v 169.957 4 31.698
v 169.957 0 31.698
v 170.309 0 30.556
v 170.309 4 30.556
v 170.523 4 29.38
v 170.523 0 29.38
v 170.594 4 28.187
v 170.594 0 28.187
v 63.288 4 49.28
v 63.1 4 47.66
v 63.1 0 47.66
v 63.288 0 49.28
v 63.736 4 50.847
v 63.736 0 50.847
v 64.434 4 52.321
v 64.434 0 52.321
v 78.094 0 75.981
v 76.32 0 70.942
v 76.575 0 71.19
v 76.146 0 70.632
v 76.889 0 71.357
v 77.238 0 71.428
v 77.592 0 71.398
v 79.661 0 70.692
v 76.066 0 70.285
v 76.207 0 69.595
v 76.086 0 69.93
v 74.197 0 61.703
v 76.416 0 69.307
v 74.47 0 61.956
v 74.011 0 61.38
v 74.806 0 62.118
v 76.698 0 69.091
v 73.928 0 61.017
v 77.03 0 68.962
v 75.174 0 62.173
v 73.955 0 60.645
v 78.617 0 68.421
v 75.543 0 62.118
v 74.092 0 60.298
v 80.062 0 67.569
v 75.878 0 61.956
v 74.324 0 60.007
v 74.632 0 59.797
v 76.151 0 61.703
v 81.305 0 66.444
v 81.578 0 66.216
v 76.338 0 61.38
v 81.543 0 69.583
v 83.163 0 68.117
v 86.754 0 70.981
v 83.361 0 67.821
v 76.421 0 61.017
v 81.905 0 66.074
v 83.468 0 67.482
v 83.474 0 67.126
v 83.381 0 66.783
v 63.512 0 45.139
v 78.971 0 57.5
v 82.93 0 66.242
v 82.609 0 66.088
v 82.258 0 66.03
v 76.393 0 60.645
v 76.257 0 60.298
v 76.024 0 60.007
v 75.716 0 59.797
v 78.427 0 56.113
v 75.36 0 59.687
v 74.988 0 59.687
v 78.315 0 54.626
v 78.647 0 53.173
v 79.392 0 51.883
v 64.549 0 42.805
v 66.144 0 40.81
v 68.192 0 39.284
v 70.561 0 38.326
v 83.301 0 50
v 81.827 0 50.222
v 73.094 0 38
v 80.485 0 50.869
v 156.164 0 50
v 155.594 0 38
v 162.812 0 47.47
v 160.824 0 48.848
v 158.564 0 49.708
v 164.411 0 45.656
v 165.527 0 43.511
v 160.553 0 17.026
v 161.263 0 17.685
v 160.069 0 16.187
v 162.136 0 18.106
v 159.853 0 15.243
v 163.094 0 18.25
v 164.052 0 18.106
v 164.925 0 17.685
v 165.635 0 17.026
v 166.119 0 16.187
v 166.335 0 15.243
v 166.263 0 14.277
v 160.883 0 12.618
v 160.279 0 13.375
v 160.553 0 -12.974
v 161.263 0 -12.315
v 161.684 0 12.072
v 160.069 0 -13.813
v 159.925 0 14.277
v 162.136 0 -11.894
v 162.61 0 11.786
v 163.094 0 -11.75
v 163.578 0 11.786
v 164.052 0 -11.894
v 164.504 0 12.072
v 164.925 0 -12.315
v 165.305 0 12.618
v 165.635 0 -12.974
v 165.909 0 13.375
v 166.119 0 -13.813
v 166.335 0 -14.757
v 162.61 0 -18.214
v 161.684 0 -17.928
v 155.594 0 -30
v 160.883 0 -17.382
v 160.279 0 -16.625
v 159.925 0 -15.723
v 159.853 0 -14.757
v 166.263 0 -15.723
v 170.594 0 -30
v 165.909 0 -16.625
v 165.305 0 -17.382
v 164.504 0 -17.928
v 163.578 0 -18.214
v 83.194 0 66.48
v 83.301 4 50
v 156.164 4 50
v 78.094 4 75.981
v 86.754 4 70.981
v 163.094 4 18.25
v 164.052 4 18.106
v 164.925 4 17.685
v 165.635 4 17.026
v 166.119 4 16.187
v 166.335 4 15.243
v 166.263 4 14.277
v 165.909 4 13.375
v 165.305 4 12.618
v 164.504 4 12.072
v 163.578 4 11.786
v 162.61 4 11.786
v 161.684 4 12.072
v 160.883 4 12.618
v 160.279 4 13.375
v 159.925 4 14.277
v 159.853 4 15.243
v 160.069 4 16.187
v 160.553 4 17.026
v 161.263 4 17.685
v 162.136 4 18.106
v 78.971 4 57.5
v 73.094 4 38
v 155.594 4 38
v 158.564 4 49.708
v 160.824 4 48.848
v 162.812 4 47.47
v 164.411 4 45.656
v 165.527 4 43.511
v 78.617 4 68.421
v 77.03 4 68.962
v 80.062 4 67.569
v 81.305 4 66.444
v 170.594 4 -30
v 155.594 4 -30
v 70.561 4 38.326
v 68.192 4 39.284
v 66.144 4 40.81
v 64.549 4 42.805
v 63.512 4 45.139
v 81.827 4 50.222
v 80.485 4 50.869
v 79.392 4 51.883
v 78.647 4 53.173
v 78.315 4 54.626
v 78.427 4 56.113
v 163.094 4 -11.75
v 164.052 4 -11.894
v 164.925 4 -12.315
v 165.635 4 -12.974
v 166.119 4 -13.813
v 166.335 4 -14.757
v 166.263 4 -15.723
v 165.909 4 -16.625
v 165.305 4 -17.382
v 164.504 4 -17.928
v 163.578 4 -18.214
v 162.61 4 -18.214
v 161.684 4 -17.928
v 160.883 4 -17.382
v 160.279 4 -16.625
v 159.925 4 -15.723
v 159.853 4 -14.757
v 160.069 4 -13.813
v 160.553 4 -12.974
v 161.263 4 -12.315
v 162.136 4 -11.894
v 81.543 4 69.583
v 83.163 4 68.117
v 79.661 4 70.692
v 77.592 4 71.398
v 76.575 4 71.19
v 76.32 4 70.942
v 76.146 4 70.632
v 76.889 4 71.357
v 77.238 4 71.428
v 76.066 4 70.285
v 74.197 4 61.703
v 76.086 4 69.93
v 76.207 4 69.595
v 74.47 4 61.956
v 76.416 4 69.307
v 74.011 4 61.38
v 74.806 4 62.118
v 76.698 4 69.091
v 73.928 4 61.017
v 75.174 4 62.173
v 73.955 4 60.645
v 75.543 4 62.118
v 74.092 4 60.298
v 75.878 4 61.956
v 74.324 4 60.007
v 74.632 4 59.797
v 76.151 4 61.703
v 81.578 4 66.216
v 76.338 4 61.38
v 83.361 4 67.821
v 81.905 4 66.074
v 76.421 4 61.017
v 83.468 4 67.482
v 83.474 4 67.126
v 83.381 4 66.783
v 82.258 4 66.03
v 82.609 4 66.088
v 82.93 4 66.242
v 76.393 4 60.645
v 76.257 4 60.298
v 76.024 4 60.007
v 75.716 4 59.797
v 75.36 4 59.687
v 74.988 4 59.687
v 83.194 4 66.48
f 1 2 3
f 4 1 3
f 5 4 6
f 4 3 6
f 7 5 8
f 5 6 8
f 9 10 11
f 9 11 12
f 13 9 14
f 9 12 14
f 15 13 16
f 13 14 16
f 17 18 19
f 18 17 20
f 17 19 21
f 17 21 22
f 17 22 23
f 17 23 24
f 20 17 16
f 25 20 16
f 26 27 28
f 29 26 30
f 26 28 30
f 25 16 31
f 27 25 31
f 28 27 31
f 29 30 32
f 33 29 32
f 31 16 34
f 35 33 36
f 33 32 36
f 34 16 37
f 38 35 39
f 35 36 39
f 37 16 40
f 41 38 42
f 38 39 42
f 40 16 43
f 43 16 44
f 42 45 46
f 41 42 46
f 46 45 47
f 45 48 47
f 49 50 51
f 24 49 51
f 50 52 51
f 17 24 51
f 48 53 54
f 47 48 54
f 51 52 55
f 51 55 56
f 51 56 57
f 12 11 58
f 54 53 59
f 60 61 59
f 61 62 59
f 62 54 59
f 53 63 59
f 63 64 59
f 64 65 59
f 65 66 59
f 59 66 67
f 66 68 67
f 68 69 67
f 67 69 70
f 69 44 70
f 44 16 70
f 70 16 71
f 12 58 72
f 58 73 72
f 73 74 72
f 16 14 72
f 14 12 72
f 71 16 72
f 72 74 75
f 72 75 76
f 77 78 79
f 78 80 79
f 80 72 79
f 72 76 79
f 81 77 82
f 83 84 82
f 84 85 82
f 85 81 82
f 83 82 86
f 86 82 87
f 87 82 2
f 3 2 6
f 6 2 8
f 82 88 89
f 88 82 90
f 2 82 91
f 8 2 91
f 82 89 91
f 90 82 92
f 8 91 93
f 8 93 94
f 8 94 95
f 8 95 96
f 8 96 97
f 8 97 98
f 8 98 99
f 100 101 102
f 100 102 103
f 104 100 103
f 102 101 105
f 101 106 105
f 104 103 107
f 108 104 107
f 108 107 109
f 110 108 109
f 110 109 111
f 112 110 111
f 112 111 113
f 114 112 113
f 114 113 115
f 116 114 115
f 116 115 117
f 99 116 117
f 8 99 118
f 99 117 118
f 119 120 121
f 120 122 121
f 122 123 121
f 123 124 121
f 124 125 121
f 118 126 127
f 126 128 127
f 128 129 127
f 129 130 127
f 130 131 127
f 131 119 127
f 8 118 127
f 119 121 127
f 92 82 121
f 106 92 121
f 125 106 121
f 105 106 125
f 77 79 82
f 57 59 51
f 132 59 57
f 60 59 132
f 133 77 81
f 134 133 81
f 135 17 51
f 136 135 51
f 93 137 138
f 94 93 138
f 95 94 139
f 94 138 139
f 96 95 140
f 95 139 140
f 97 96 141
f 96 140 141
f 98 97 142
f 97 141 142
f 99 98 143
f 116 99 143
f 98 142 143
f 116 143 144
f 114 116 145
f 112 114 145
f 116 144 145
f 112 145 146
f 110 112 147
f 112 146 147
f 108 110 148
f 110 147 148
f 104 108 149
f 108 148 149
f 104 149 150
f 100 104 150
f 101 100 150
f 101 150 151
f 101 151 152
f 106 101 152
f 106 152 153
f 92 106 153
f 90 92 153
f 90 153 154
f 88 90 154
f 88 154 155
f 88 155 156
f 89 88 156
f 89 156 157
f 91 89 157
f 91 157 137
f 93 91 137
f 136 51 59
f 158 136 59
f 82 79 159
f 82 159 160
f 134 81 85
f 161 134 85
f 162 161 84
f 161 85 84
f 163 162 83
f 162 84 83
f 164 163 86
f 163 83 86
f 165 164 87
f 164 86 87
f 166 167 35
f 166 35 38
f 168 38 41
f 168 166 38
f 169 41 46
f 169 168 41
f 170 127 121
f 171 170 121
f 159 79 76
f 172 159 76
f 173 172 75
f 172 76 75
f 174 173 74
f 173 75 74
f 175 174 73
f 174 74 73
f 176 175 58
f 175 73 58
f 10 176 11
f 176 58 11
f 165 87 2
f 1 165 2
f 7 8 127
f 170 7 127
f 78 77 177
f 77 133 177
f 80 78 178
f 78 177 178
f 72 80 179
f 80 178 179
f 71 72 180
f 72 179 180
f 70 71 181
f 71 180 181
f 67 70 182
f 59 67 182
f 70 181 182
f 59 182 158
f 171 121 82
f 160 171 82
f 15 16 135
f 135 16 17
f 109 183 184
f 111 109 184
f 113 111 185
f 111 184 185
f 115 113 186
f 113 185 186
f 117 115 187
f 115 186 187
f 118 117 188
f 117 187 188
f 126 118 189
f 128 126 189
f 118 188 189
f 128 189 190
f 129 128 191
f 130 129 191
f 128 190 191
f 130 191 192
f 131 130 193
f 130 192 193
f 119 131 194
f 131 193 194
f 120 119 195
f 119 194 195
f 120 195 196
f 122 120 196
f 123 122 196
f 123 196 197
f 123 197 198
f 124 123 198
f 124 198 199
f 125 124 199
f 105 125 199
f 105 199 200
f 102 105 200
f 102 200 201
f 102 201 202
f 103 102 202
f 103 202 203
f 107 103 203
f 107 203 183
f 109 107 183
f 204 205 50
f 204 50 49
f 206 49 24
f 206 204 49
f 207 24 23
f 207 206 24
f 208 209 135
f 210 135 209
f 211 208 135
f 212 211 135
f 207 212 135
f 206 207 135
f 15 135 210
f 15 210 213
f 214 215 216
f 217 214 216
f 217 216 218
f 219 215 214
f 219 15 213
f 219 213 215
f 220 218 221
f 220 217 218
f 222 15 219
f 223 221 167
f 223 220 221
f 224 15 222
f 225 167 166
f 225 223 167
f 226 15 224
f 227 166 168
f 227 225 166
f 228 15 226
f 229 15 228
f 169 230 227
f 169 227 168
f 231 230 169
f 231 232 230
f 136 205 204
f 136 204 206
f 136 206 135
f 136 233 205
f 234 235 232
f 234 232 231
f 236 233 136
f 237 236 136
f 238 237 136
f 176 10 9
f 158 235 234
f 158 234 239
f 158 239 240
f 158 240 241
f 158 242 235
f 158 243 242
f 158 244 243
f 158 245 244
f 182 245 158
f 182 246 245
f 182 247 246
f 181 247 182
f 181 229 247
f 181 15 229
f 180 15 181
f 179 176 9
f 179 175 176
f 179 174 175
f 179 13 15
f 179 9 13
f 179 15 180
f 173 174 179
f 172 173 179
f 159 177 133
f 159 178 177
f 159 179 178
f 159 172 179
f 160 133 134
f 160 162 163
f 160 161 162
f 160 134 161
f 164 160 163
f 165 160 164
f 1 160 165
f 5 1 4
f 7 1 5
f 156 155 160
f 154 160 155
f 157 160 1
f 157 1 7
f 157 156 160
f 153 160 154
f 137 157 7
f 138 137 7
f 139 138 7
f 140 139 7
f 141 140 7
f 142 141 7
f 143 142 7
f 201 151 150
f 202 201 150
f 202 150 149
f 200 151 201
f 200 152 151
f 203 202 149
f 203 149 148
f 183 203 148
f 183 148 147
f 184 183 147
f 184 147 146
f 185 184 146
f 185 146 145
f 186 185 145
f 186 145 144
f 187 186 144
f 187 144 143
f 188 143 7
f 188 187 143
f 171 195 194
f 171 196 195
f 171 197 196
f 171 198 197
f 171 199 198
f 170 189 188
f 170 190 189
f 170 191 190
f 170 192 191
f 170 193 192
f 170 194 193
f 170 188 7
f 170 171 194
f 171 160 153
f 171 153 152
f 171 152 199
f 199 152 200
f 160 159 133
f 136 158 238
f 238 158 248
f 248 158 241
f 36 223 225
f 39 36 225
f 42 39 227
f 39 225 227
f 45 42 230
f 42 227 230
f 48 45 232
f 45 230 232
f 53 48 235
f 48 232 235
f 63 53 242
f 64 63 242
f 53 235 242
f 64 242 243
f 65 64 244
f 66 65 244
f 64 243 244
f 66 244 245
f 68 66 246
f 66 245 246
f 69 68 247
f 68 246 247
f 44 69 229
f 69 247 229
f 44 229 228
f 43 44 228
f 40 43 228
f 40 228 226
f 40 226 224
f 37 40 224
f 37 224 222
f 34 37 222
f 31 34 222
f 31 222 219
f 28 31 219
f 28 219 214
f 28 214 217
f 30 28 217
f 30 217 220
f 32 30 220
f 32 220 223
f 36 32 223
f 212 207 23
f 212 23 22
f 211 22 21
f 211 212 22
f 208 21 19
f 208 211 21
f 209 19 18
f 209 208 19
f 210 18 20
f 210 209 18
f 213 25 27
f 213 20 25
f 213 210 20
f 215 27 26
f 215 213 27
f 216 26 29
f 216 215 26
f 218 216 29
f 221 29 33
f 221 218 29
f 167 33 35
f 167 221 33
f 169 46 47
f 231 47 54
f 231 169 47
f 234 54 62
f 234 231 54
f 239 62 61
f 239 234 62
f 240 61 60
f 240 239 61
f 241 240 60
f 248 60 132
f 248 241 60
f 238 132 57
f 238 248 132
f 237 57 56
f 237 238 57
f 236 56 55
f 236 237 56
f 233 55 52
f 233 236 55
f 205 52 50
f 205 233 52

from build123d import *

# Parameters (mm, degrees)
BOSS_EXTRUDE1_DEPTH = 4
SKETCH2_W           = 92.5
SKETCH2_H           = 8
CUT_EXTRUDE1_DEPTH  = 187.792378648
SKETCH3_R           = 1.25
CUT_EXTRUDE2_DEPTH  = 187.792378648
SKETCH4_R           = 3.25
CUT_EXTRUDE3_DEPTH  = 187.792378648
FILLET1_R           = 10
FILLET2_R           = 5
CUT_EXTRUDE4_DEPTH  = 187.792378648


with BuildPart() as part:
    # Sketch1 → Boss-Extrude1 (new body)
    with BuildSketch(Plane(origin=(0, 0, 0), x_dir=(1, 0, 0), z_dir=(0, 1, 0))):
        Polygon((155.594010768, -30), (63.094010768, -30), (63.094010768, -50), (78.094010768, -75.980762114), (86.754264805, -70.980762114), (74.641016151, -50), (163.094010768, -50), (170.594010768, -30), (170.594010768, 30), (155.594010768, 30), align=None)
    extrude(amount=BOSS_EXTRUDE1_DEPTH)

    # Sketch2 → Cut-Extrude1 (cut, through all)
    with BuildSketch(Plane(origin=(0, 0, 0), x_dir=(1, 0, 0), z_dir=(0, 1, 0))):
        with Locations((109.344010768, -34)):
            Rectangle(SKETCH2_W, SKETCH2_H)
    extrude(amount=CUT_EXTRUDE1_DEPTH, mode=Mode.SUBTRACT)

    # Sketch3 → Cut-Extrude2 (cut, through all)
    with BuildSketch(Plane(origin=(0, 4, 0), x_dir=(1, 0, 0), z_dir=(0, 1, 0))):
        with Locations(Location((75.174137787, -60.923393759, 0), (0, 0, 270))):
            Circle(SKETCH3_R)
        with Locations(Location((79.924137787, -69.150635095, 0), (0, 0, 270))):
            Circle(SKETCH3_R)
    extrude(amount=-CUT_EXTRUDE2_DEPTH, mode=Mode.SUBTRACT)

    # Sketch4 → Cut-Extrude3 (cut, through all)
    with BuildSketch(Plane(origin=(0, 4, 0), x_dir=(1, 0, 0), z_dir=(0, 1, 0))):
        with Locations(Location((163.094010768, 15, 0), (0, 0, 270))):
            Circle(SKETCH4_R)
        with Locations(Location((163.094010768, -15, 0), (0, 0, 270))):
            Circle(SKETCH4_R)
    extrude(amount=-CUT_EXTRUDE3_DEPTH, mode=Mode.SUBTRACT)

    # Fillet1
    # the kernel refuses this fillet: 10 mm, written as the material it takes off along each edge
    with BuildSketch(Plane(origin=(63.094010768, -6.698729811, 50), x_dir=(0, 0, -1), z_dir=(0, 1, 0))) as fillet1_piece_1:
        with BuildLine():
            CenterArc((FILLET1_R * 0.267949192431, -FILLET1_R), FILLET1_R, 90, 30)
            Line((-FILLET1_R * 0.232050807569, -FILLET1_R * 0.133974596216), (0, 0))
            Line((0, 0), (FILLET1_R * 0.267949192431, 0))
        make_face()
    extrude(amount=17.397459622, mode=Mode.SUBTRACT)
    with BuildSketch(Plane(origin=(63.094010768, -25, 38), x_dir=(1, 0, 0), z_dir=(0, 1, 0))) as fillet1_piece_2:
        with BuildLine():
            CenterArc((FILLET1_R, -FILLET1_R), FILLET1_R, 90, 90)
            Line((0, -FILLET1_R), (0, 0))
            Line((0, 0), (FILLET1_R, 0))
        make_face()
    extrude(amount=54, mode=Mode.SUBTRACT)
    with BuildSketch(Plane(origin=(163.094010768, -17.325011704, 50), x_dir=(0.35112344158838954, 0, -0.9363291775690453), z_dir=(0, 1, 0))) as fillet1_piece_3:
        with BuildLine():
            CenterArc((FILLET1_R * 0.693000468165, FILLET1_R), FILLET1_R, 200.55604522, 69.44395478)
            Line((-FILLET1_R * 0.243328709404, FILLET1_R * 0.648876558412), (0, 0))
            Line((0, 0), (FILLET1_R * 0.693000468165, 0))
        make_face()
    extrude(amount=38.650023408, mode=Mode.SUBTRACT)
    with BuildSketch(Plane(origin=(170.594010768, -4.533364544, 30), x_dir=(0, 0, -1), z_dir=(0, 1, 0))) as fillet1_piece_4:
        with BuildLine():
            CenterArc((FILLET1_R * 0.181334581773, FILLET1_R), FILLET1_R, 249.44395478, 20.55604522)
            Line((-FILLET1_R * 0.169788859816, FILLET1_R * 0.063670822431), (0, 0))
            Line((0, 0), (FILLET1_R * 0.181334581773, 0))
        make_face()
    extrude(amount=13.066729089, mode=Mode.SUBTRACT)

    # Fillet2
    fillet2_edges = [part.edges().sort_by_distance(p)[0] for p in [
        (74.641016151, 2, 50),
    ]]
    fillet(fillet2_edges, radius=FILLET2_R)

    # Sketch5 → Cut-Extrude4 (cut, through all)
    with BuildSketch(Plane(origin=(0, 4, 0), x_dir=(1, 0, 0), z_dir=(0, 1, 0))):
        with BuildLine():
            ThreePointArc((83.16294466, -68.116547777), (80.630175188, -70.185907233), (77.592361621, -71.397871955))
            ThreePointArc((77.592361621, -71.397871955), (76.093210222, -70.461098192), (77.029983985, -68.961946793))
            ThreePointArc((77.029983985, -68.961946793), (79.361329281, -68.031834332), (81.305082597, -66.443721261))
            ThreePointArc((81.305082597, -66.443721261), (83.070426886, -66.351203487), (83.16294466, -68.116547777))
        make_face()
    extrude(amount=-CUT_EXTRUDE4_DEPTH, mode=Mode.SUBTRACT)


solid = part.part
